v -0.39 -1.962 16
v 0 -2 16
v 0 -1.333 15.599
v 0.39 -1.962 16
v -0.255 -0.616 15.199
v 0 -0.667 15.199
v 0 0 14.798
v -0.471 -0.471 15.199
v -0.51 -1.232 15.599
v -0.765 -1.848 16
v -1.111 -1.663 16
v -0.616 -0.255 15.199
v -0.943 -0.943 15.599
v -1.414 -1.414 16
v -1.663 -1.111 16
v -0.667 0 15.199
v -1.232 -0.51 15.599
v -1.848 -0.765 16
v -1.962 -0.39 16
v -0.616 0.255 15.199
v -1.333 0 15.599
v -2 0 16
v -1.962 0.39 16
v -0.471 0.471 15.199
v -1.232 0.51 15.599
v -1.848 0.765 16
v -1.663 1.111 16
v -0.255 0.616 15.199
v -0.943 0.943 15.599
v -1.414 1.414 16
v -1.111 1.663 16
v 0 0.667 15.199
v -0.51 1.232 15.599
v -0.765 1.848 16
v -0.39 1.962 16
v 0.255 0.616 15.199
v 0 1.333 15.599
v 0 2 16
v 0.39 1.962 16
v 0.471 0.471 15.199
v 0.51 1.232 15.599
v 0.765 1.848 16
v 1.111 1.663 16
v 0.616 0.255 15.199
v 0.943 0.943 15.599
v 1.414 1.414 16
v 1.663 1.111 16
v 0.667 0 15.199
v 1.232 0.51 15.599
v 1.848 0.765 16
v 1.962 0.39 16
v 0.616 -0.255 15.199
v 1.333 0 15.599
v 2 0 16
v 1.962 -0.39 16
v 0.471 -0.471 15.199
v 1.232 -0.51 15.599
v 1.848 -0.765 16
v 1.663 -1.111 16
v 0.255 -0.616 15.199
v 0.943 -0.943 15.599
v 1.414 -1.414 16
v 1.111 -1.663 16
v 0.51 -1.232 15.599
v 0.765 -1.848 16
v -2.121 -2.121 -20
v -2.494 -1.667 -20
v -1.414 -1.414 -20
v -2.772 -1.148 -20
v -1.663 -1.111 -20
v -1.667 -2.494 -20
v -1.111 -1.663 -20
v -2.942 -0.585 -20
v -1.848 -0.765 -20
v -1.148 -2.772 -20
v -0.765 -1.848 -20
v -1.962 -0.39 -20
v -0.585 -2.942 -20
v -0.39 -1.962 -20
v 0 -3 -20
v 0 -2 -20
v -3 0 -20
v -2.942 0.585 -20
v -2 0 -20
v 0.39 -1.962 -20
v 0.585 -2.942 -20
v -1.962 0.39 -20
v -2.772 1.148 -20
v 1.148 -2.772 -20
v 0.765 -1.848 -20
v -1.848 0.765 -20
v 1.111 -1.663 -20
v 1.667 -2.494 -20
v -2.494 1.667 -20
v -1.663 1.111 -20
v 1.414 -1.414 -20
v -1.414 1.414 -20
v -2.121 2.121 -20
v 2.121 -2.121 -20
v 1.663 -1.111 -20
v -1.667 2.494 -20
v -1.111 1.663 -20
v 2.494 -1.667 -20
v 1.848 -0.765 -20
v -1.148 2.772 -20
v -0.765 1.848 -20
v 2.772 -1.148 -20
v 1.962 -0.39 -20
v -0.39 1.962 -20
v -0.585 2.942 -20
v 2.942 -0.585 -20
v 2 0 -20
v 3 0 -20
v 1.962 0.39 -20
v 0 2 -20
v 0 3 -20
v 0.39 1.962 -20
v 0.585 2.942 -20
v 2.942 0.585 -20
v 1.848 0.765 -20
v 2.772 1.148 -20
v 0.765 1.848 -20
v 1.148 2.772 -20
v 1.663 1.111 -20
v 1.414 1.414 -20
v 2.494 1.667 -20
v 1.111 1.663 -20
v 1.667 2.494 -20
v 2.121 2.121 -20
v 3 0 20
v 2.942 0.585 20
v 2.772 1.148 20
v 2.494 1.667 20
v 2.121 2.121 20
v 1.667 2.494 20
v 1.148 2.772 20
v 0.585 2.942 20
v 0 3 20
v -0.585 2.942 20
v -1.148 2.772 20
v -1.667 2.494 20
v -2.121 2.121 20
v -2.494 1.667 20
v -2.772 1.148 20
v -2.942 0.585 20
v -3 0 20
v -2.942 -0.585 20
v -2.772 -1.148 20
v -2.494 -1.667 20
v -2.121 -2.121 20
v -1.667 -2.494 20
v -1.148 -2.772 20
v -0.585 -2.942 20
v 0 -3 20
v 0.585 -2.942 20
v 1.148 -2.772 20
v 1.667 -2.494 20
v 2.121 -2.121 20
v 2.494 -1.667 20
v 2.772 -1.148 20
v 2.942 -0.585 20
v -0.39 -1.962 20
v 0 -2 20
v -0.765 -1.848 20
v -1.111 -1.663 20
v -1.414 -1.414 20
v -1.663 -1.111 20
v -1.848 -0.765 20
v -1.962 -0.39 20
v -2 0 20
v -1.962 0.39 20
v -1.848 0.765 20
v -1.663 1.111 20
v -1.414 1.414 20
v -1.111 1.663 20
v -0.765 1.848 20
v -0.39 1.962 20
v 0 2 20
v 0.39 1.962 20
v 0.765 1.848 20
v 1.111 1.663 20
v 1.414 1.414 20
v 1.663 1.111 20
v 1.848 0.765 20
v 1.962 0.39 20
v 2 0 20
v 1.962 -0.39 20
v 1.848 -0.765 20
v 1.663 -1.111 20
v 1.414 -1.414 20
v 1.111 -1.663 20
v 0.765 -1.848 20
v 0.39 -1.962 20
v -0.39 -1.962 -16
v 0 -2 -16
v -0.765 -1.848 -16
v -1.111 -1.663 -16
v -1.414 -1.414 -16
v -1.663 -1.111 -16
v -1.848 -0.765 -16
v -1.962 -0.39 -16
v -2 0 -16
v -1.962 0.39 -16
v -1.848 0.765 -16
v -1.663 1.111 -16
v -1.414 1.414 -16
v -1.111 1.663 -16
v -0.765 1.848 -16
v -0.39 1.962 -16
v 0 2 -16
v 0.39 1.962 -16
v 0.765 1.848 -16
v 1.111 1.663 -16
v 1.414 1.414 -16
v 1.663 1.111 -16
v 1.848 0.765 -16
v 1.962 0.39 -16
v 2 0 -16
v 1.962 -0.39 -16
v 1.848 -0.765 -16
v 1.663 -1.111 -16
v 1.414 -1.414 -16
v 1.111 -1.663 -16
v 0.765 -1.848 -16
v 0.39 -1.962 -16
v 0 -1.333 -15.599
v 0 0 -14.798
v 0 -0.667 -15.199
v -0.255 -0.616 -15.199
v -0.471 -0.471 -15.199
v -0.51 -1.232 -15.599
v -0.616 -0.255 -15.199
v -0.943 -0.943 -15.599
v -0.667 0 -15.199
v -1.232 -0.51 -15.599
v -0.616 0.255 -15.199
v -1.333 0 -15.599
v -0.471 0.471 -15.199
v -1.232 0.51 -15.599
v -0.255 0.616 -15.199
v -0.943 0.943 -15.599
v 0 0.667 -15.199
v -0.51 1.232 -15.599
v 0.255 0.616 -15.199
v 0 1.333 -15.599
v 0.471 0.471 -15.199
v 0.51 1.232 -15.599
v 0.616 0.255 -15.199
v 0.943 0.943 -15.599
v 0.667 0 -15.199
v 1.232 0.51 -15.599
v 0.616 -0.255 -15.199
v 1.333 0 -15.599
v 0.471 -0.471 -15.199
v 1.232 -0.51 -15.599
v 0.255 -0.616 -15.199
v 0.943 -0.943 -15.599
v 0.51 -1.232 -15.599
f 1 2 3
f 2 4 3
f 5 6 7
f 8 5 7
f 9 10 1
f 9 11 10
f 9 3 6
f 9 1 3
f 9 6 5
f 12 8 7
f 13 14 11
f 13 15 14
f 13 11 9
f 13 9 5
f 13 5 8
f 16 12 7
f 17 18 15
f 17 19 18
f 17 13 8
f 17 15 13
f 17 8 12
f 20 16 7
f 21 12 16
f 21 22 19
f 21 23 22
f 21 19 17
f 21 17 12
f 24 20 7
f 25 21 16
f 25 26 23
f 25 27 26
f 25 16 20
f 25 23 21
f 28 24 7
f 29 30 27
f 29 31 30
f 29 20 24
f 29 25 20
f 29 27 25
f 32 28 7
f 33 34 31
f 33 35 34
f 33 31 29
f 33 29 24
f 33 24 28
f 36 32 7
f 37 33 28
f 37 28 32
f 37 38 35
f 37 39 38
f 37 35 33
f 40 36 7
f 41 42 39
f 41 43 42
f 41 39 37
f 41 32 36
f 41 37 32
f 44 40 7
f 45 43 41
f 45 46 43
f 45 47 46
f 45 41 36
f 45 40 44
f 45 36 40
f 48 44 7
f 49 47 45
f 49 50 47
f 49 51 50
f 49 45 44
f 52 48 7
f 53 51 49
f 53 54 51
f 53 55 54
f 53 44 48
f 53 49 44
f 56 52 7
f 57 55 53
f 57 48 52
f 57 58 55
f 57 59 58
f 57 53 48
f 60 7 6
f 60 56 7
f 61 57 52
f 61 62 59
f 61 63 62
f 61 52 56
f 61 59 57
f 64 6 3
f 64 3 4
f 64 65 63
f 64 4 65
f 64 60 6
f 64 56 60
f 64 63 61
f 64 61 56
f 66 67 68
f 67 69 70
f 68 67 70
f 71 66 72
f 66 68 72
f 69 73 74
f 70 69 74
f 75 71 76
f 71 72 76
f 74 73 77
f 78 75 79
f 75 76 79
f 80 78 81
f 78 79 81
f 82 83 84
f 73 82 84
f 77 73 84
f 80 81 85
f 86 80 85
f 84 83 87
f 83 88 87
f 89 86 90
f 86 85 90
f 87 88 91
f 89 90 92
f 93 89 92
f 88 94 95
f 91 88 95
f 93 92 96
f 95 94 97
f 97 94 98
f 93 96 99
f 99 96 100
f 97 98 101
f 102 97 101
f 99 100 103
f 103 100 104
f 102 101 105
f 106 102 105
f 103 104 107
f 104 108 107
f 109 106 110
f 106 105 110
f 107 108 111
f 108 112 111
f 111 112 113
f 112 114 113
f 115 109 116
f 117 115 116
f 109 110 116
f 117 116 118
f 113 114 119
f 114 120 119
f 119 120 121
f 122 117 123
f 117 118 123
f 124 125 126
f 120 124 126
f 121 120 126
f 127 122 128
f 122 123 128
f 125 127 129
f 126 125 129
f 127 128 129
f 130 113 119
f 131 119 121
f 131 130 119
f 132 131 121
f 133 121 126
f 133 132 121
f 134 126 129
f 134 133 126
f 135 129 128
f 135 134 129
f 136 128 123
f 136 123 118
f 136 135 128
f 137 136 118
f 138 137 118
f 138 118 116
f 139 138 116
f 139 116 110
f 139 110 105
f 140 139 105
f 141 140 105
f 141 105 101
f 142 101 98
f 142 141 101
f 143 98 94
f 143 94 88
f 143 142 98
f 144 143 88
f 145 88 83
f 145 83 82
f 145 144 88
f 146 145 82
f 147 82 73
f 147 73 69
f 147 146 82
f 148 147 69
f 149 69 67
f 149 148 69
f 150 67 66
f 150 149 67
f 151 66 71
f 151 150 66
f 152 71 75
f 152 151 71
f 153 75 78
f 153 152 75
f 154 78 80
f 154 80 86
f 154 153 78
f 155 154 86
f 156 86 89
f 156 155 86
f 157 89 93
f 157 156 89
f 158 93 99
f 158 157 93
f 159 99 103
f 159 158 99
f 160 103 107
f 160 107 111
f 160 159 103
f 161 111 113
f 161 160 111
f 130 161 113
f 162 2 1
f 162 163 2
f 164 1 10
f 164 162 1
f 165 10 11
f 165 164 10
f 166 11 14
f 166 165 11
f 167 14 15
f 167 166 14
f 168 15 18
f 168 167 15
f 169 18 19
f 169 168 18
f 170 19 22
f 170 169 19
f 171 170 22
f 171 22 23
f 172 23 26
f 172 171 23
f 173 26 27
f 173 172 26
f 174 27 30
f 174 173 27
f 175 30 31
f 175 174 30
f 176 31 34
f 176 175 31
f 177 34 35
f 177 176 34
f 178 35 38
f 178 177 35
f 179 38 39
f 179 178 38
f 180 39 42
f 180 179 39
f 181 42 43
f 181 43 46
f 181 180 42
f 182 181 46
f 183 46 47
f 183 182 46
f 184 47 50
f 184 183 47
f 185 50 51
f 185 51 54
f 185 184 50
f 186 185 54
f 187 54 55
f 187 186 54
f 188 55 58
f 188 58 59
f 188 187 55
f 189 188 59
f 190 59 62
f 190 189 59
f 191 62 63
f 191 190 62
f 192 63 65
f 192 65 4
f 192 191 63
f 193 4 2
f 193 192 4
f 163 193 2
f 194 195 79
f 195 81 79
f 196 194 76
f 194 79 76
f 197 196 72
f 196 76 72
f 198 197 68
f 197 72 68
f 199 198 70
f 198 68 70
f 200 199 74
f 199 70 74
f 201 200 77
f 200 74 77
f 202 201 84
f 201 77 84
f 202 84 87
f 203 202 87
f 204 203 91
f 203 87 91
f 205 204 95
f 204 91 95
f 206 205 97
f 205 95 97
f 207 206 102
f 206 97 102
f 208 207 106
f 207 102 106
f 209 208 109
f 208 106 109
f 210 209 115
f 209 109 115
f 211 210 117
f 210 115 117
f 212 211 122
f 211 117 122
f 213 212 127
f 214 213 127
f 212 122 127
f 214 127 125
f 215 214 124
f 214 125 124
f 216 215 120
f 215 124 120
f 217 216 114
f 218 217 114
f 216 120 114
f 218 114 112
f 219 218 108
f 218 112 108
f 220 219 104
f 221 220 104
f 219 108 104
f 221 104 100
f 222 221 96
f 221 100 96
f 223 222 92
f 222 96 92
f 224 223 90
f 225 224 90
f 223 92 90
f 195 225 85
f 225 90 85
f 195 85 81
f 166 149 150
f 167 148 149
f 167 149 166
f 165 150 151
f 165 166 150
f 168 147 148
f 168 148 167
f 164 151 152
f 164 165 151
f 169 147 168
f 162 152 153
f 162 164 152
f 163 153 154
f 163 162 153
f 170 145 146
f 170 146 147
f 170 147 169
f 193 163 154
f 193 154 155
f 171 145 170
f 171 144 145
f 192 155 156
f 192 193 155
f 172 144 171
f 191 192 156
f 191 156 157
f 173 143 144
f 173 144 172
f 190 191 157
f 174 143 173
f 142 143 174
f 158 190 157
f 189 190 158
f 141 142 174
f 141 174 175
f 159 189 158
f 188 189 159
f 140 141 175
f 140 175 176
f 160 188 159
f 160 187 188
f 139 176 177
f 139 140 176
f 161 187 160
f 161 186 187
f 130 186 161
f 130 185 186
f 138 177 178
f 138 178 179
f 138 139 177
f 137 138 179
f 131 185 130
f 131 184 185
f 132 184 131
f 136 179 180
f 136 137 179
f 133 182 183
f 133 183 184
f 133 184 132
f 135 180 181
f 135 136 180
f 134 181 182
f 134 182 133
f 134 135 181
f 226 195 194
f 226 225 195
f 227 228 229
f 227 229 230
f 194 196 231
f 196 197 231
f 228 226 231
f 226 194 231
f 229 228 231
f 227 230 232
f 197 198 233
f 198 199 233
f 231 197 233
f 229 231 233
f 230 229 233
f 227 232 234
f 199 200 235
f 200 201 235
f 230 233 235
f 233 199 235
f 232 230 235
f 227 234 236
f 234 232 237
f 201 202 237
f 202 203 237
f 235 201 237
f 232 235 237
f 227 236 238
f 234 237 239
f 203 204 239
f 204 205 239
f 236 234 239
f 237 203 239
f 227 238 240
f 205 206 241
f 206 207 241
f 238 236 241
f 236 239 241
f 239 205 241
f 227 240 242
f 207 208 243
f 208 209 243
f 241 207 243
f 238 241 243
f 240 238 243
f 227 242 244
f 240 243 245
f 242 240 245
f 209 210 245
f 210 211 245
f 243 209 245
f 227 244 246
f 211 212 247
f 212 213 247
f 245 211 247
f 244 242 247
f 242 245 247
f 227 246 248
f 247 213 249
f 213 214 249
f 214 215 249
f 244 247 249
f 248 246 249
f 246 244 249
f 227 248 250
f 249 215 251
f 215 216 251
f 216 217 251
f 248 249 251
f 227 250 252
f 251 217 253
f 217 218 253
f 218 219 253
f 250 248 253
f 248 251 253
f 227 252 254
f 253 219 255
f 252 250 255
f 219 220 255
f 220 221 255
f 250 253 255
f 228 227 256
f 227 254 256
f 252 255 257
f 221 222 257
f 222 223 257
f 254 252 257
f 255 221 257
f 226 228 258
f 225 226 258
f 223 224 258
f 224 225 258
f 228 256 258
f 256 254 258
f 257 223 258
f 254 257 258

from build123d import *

# Parameters (mm, degrees)
SKICA1_R        = 3
VYSUNOUT1_DEPTH = 20


with BuildPart() as part:
    # Skica1 → Vysunout1 (new, symmetric)
    with BuildSketch(Plane.XY):
        Circle(SKICA1_R)
    extrude(amount=VYSUNOUT1_DEPTH, both=True)

    # Skica2 → Díra1 (revolve, cut)
    with BuildSketch(Plane(origin=(0, 0, 20), x_dir=(0, -1, 0), z_dir=(1, 0, 0))):
        Polygon((0, 0), (0, 5.201721238), (2, 4), (2, 0), align=None)
    d_ra1 = revolve(axis=Axis((0, 0, 24.244199587), (0, 0, -1)), mode=Mode.SUBTRACT)

    # Zrcadlit1: Díra1 across plane
    add(d_ra1.mirror(Plane.XY), mode=Mode.SUBTRACT)


solid = part.part
